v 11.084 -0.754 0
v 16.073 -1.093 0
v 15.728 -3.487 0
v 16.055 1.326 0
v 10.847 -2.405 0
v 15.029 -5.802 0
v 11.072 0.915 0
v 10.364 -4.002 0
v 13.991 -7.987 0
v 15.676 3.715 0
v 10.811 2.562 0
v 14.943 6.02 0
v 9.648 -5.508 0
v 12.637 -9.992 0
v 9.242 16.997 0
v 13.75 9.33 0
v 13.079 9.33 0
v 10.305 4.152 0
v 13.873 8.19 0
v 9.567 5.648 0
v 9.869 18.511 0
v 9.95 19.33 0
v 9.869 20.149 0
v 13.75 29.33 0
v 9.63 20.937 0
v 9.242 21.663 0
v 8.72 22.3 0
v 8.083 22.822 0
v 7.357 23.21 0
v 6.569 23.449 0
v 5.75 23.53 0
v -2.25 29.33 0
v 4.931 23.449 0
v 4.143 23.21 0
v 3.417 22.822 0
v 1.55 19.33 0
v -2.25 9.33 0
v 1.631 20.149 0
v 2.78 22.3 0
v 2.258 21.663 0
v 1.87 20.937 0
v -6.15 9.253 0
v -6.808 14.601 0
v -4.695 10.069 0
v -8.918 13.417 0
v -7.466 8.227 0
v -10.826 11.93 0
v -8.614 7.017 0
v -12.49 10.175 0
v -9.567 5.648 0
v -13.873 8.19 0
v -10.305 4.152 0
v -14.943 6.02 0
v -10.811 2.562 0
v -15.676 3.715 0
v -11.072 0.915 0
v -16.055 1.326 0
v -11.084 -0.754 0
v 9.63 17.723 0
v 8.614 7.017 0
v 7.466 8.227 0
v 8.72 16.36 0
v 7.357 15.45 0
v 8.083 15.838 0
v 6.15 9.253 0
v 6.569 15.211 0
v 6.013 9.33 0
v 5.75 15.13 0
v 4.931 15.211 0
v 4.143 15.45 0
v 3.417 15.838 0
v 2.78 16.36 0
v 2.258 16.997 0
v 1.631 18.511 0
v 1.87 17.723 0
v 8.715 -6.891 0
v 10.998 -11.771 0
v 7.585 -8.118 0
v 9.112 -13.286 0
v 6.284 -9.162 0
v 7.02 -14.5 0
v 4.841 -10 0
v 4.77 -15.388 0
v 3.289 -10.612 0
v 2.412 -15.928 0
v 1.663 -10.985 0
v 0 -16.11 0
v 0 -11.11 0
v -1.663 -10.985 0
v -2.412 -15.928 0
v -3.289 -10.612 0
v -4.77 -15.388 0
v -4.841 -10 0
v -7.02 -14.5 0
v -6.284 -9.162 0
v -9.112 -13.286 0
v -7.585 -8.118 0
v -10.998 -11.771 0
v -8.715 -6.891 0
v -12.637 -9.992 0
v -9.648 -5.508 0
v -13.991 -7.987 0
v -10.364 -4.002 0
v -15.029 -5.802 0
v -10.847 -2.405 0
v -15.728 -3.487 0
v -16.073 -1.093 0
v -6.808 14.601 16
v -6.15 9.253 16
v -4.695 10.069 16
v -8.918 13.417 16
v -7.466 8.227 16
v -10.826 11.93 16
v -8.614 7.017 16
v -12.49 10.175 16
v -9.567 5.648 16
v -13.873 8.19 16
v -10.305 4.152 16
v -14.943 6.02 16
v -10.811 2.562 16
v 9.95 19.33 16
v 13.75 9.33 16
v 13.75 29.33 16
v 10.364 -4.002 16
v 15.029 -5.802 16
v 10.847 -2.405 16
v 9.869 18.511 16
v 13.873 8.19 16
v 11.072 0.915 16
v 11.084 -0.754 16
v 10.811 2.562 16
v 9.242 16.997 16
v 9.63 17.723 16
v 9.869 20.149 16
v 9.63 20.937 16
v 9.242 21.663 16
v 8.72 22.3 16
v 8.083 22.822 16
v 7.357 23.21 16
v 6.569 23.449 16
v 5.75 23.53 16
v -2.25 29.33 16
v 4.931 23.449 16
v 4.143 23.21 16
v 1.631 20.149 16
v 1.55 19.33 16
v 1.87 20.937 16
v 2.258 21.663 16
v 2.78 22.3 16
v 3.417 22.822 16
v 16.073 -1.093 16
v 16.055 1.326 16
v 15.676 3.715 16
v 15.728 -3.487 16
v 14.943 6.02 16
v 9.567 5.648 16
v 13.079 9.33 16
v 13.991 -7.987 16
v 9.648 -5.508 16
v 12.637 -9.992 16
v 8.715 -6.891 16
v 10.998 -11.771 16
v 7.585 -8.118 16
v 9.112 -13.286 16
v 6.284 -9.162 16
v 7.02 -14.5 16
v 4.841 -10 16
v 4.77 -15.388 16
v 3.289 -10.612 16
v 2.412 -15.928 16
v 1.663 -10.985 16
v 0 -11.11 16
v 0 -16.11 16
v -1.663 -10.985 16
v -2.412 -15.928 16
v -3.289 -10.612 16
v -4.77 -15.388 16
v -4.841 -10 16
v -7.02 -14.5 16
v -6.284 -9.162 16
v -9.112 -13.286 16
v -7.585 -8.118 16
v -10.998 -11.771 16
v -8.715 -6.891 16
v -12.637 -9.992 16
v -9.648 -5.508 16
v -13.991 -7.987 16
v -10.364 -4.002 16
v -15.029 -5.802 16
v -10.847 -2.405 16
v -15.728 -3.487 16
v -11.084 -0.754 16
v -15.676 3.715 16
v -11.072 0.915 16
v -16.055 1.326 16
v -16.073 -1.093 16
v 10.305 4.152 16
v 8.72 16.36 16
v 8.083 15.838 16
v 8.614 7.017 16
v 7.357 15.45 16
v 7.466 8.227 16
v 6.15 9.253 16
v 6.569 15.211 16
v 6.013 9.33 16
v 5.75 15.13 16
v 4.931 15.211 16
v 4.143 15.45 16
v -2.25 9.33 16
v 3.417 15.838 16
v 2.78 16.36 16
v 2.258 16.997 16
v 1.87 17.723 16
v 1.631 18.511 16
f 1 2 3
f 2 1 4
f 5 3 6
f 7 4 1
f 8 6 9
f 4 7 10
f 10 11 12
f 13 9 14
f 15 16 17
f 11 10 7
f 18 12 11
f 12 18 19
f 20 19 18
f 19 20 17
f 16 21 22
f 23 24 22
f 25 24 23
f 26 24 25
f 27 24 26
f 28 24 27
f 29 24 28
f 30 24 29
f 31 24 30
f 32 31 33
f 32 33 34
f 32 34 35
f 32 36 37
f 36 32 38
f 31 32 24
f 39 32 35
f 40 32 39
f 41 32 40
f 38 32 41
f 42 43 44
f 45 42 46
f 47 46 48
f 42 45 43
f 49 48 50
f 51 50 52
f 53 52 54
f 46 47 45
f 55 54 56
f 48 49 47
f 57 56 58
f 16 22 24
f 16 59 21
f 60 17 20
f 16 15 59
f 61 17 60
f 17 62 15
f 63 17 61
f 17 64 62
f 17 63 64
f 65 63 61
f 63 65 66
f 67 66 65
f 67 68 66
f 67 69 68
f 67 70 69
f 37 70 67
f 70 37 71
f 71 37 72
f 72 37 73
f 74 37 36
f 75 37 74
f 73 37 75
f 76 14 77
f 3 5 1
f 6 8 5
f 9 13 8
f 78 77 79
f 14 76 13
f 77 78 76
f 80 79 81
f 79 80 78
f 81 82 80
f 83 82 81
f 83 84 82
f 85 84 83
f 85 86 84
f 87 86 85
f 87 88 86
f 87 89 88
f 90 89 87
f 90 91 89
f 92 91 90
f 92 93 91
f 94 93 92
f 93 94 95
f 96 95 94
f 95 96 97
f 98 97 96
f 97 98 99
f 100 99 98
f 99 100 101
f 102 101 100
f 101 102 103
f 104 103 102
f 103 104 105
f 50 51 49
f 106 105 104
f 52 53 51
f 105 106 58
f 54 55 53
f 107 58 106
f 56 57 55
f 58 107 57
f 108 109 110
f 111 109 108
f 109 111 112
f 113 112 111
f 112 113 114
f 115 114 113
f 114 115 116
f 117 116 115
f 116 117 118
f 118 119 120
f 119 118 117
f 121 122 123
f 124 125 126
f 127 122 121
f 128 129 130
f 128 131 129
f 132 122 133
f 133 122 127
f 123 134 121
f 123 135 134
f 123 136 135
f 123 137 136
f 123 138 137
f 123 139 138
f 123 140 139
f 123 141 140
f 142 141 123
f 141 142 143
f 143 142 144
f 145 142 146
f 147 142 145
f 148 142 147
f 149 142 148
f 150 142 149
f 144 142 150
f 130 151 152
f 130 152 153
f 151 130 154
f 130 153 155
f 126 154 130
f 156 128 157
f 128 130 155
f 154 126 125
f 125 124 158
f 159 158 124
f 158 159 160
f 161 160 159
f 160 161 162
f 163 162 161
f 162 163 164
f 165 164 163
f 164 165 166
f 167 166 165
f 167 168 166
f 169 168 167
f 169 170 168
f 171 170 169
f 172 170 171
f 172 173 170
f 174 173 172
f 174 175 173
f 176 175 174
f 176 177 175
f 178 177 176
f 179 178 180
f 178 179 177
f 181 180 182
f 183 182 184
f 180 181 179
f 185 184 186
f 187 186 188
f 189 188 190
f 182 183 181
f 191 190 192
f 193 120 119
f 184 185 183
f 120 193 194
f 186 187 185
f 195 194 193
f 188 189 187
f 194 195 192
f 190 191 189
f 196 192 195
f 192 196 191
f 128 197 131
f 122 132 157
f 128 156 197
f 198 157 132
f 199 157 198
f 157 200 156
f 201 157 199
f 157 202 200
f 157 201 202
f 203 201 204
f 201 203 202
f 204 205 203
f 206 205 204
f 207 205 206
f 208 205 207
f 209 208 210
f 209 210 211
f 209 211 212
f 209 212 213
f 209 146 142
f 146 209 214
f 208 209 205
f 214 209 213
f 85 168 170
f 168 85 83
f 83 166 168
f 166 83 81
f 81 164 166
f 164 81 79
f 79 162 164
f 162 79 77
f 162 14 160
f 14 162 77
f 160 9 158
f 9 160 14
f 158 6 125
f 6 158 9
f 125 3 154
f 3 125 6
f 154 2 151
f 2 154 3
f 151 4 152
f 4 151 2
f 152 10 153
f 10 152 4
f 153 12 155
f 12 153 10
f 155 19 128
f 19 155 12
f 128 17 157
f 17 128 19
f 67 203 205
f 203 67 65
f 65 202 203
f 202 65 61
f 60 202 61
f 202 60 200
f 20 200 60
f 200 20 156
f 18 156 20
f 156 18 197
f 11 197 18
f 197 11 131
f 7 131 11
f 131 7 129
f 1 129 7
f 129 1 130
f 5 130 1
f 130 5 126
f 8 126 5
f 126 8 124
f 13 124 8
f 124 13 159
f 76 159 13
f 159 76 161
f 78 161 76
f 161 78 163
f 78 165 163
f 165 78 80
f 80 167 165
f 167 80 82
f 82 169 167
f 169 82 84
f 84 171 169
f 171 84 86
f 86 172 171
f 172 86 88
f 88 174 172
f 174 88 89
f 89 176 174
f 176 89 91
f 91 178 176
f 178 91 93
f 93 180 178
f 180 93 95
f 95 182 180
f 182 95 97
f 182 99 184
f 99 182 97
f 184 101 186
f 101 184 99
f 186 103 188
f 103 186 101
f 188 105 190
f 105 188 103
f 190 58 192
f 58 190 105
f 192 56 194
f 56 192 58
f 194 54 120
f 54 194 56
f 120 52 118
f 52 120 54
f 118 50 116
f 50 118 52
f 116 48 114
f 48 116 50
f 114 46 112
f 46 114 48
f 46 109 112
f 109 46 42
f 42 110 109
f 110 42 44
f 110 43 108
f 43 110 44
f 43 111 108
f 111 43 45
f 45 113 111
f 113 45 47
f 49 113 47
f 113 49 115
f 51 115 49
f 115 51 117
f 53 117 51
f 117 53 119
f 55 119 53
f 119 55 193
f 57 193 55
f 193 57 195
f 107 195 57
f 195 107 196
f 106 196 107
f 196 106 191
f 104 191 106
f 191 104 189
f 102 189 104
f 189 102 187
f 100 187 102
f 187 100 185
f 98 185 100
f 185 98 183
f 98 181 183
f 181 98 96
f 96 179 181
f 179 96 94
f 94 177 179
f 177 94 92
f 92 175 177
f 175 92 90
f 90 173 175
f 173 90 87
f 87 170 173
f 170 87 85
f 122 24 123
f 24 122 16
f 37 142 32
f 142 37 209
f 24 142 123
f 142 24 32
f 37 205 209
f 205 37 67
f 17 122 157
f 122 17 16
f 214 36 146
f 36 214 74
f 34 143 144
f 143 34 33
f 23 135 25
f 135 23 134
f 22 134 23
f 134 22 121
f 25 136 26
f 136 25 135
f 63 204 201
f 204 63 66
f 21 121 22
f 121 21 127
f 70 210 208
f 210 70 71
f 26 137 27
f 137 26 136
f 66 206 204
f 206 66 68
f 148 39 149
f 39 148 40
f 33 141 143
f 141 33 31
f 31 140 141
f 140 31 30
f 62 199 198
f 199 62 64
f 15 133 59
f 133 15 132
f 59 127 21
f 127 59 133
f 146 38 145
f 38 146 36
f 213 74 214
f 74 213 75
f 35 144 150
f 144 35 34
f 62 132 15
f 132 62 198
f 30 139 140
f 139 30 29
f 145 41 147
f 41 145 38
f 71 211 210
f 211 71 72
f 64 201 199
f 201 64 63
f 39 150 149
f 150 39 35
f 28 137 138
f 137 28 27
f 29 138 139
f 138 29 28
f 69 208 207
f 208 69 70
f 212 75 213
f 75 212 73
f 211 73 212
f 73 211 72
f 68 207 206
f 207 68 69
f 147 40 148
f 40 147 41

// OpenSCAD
$fn = 32;

// ----------------------------------------------------------------------
// Pipe clamp: 32.22 mm ring, 5 mm wall, 16 mm wide
// ----------------------------------------------------------------------

// --- parameters (mm) ---
outer_r = 16.11;          // clamp outside radius
inner_r = 11.11;          // pipe bore radius
band = 5;                 // band thickness
clamp_w = 16;             // clamp width
opening = 50;             // opening angle between the ends
lug_w = 16;               // lug width
lug_len = 20;             // lug length
bolt_d = 8.4;             // bolt hole

clamp_profile = [[-6.808, 14.601], [-8.918, 13.417], [-10.826, 11.93], [-12.49, 10.175], [-13.873, 8.19], [-14.943, 6.02], [-15.676, 3.715], [-16.055, 1.326], [-16.073, -1.093], [-15.728, -3.487], [-15.029, -5.802], [-13.991, -7.987], [-12.637, -9.992], [-10.998, -11.771], [-9.112, -13.286], [-7.02, -14.5], [-4.77, -15.388], [-2.412, -15.928], [0, -16.11], [2.412, -15.928], [4.77, -15.388], [7.02, -14.5], [9.112, -13.286], [10.998, -11.771], [12.637, -9.992], [13.991, -7.987], [15.029, -5.802], [15.728, -3.487], [16.073, -1.093], [16.055, 1.326], [15.676, 3.715], [14.943, 6.02], [13.873, 8.19], [12.49, 10.175], [10.826, 11.93], [8.918, 13.417], [6.808, 14.601], [4.695, 10.069], [6.15, 9.253], [7.466, 8.227], [8.614, 7.017], [9.567, 5.648], [10.305, 4.152], [10.811, 2.562], [11.072, 0.915], [11.084, -0.754], [10.847, -2.405], [10.364, -4.002], [9.648, -5.508], [8.715, -6.891], [7.585, -8.118], [6.284, -9.162], [4.841, -10], [3.289, -10.612], [1.663, -10.985], [0, -11.11], [-1.663, -10.985], [-3.289, -10.612], [-4.841, -10], [-6.284, -9.162], [-7.585, -8.118], [-8.715, -6.891], [-9.648, -5.508], [-10.364, -4.002], [-10.847, -2.405], [-11.084, -0.754], [-11.072, 0.915], [-10.811, 2.562], [-10.305, 4.152], [-9.567, 5.648], [-8.614, 7.017], [-7.466, 8.227], [-6.15, 9.253], [-4.695, 10.069]];

difference() {
  union() {
    linear_extrude(height = clamp_w) polygon(clamp_profile);
    /* bolt lug on the other end */
    translate([-2.25, 9.33, 0]) cube([lug_w, 20, clamp_w]);
  }
  translate([5.75, 19.33, -2.5]) cylinder(h = clamp_w + 5, d = bolt_d);
}
